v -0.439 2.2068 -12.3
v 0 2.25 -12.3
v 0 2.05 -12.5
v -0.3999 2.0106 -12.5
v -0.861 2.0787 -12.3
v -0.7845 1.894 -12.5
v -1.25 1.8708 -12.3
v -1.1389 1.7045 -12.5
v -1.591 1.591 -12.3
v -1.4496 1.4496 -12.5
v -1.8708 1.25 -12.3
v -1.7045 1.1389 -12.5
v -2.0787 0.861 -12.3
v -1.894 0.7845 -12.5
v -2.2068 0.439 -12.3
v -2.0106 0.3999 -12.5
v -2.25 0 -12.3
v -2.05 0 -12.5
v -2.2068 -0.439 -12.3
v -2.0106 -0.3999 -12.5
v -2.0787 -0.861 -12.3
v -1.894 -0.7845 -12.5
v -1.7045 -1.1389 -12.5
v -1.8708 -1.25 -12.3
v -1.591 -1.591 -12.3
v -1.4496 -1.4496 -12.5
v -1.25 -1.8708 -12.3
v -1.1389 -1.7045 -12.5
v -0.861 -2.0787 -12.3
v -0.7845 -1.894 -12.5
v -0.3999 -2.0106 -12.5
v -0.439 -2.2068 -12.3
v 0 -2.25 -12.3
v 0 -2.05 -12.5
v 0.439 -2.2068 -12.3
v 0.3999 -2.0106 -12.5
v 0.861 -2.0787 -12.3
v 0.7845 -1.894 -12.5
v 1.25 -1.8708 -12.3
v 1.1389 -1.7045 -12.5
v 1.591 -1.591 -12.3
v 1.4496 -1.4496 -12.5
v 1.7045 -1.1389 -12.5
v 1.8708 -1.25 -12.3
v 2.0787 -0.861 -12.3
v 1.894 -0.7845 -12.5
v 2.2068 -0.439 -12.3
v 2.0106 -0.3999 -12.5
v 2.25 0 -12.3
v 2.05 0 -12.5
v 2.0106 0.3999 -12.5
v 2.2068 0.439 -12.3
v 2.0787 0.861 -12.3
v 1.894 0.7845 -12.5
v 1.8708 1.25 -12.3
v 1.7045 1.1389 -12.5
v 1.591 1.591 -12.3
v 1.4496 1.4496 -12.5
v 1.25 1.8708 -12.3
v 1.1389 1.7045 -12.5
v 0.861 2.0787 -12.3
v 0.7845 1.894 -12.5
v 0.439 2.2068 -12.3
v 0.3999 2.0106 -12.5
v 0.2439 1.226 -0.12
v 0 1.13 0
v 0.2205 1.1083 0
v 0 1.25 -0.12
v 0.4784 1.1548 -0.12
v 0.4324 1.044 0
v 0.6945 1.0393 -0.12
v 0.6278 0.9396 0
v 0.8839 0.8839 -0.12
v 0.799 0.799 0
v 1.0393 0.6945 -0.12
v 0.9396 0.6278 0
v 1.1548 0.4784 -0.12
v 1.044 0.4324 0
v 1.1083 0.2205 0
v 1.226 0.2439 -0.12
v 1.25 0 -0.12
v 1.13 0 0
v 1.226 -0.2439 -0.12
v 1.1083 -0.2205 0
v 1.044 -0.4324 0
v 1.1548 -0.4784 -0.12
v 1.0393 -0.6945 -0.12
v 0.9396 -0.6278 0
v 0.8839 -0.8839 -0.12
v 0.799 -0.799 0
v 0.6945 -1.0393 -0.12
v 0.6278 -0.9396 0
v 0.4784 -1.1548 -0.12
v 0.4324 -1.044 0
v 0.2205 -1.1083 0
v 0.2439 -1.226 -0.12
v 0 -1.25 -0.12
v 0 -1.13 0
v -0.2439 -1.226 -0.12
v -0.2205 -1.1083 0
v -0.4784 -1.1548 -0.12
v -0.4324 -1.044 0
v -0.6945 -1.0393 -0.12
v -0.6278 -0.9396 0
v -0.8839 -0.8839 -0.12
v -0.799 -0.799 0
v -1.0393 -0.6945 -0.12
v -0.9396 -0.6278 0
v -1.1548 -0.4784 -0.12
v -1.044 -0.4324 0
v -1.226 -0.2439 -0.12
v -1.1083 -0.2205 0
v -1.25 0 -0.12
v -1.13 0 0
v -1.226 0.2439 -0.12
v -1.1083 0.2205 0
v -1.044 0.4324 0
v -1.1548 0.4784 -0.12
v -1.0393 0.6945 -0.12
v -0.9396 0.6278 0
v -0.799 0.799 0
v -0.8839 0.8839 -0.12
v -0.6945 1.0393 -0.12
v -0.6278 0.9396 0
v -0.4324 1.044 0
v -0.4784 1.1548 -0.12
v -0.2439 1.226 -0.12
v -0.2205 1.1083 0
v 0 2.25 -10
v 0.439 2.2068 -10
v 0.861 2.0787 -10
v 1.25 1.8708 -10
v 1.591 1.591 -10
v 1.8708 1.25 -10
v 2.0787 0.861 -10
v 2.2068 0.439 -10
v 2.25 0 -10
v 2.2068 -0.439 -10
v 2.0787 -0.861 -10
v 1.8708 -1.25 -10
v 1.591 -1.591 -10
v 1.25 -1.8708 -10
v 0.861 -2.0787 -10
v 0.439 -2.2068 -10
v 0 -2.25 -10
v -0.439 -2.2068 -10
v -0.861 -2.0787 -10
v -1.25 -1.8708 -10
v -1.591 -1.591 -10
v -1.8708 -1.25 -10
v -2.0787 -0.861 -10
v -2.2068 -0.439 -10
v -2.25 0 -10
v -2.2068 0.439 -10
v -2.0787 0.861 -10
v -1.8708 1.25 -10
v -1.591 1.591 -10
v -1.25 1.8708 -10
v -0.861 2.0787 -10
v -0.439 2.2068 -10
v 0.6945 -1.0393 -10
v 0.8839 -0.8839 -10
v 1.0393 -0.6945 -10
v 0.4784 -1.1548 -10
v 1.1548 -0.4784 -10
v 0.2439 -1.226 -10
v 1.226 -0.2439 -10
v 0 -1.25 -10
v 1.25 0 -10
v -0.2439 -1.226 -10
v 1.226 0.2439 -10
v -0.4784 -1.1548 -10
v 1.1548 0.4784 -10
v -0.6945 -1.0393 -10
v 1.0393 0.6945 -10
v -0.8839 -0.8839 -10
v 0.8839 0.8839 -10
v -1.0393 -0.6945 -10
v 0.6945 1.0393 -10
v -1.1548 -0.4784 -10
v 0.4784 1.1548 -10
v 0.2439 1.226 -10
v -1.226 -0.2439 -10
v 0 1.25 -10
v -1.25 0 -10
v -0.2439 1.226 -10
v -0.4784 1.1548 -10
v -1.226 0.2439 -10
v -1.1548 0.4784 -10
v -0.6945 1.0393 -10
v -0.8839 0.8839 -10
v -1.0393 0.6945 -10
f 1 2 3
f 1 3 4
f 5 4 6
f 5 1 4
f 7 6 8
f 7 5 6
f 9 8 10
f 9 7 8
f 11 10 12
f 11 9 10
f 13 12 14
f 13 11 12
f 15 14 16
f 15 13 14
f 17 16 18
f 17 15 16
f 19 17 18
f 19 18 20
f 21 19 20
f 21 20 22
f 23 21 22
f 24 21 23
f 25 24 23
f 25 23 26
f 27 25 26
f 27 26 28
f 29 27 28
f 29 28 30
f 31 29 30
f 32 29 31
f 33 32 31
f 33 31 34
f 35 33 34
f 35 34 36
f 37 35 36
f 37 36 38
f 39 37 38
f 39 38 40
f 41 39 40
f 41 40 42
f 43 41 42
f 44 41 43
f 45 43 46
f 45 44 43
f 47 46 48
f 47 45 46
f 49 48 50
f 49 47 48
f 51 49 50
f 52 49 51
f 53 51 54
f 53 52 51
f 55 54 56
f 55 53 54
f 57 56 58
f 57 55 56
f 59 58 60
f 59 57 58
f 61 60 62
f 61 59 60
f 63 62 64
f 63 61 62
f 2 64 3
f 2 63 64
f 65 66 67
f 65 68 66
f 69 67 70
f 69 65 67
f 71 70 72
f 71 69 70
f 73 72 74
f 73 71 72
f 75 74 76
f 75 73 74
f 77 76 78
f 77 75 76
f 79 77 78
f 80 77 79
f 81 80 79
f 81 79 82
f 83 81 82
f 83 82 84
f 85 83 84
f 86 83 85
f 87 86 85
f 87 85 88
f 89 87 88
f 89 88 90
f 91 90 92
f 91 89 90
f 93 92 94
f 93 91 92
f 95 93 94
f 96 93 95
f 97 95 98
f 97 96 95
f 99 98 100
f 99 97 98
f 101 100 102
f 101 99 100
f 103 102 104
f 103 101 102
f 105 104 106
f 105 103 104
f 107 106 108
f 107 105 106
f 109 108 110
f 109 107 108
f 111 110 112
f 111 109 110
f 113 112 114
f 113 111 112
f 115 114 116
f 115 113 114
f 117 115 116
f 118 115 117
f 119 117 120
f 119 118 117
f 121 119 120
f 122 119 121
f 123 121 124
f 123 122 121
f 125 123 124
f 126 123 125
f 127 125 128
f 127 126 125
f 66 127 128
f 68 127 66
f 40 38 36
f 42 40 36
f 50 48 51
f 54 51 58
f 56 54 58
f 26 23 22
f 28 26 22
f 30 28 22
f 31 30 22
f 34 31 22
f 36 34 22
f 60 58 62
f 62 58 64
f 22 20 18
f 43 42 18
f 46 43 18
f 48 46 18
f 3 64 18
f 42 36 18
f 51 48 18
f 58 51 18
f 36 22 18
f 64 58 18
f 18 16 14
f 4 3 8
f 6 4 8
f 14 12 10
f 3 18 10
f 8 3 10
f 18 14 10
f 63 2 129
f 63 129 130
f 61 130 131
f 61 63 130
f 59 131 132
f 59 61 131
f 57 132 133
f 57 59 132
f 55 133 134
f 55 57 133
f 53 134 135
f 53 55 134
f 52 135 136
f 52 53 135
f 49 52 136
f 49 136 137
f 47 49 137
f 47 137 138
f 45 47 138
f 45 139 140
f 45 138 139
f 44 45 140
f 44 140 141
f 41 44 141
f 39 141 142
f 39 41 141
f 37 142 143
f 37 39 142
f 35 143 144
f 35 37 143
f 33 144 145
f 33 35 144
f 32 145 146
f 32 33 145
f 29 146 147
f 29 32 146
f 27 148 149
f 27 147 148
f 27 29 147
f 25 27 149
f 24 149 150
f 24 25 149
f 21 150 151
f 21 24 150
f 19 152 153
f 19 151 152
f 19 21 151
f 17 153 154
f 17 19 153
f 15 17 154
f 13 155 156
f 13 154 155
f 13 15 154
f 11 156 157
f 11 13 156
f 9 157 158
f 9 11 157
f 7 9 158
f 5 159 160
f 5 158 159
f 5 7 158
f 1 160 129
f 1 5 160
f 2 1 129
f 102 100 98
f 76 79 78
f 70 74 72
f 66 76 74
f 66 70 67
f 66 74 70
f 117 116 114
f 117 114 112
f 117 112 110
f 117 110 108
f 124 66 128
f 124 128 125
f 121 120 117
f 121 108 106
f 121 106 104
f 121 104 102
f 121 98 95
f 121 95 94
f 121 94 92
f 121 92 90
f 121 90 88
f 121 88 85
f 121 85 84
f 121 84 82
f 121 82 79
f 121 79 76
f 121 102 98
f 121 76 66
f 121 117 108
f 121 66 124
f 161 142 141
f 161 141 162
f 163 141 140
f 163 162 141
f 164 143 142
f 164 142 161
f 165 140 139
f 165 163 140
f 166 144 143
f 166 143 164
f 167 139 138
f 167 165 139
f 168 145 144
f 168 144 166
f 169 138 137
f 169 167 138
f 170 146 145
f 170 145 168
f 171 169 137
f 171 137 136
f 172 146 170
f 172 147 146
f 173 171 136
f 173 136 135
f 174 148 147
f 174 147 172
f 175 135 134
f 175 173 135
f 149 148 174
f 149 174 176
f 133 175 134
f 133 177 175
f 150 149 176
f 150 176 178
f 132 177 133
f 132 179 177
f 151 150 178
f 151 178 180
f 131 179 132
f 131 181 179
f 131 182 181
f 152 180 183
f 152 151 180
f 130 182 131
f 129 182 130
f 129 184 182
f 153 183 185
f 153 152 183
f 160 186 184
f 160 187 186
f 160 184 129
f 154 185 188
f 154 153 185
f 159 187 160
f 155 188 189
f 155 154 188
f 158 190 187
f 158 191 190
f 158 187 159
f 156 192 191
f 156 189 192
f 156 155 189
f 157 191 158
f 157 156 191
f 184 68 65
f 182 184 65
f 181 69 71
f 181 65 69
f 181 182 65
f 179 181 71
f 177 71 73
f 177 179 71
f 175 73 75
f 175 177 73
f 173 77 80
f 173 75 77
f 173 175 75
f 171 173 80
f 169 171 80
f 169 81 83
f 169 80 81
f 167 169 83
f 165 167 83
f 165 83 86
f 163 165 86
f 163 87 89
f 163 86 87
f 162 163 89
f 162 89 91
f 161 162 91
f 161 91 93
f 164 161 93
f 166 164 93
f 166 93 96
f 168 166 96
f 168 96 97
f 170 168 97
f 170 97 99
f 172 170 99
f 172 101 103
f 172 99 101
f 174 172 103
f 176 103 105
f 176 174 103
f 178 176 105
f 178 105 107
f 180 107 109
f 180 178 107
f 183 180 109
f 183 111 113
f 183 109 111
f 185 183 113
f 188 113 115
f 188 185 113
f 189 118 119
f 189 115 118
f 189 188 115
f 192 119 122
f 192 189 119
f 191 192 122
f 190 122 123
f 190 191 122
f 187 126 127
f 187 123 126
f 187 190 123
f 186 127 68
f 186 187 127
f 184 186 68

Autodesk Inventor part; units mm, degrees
ref_plane "YZ Plane" through (0, 0, 0) normal (1, 0, 0) x (0, 1, 0)
ref_plane "XZ Plane" through (0, 0, 0) normal (0, 1, 0) x (-1, 0, 0)
ref_plane "XY Plane" through (0, 0, 0) normal (0, 0, 1) x (1, 0, 0)
sketch "スケッチ1" plane through (0, 0, 0) normal (1, 0, 0) x (0, 1, 0)
  line L0 (0, 0) -> (1.25, 0)
  line L1 (1.25, 0) -> (1.25, -10)
  line L2 (1.25, -10) -> (0, -10)
  line L3 (0, -10) -> (0, 0)
  line L4 (0, -10) -> (2.25, -10)
  line L5 (2.25, -10) -> (2.25, -12.5)
  line L6 (2.25, -12.5) -> (0, -12.5)
  line L7 (0, -12.5) -> (0, -10)
  line L8 (2.25, -12.3) -> (2.05, -12.5)
  line L9 (1.25, -0.12) -> (1.13, 0)
  point P0 (2.25, -11.25)
  point P1 (1.25, -10)
  dimension "d0" = 45
  dimension "d1" = 2.25
  dimension "d2" = 2.5
  dimension "d3" = 10
  dimension "d7" = 1.25
  dimension "d10" = 45
  dimension "d11" = 0.2
  dimension "d12" = 0.12
revolve "回転1" add sketch "スケッチ1" angle 360 about axis through (0, 0, -10) along (0, 0, 1) contours L0 L9 L1 L2 L3 | L2 L4 L5 L8 L6 L7
thread "ねじ2" size "M2.5x0.45" class "6g" standard "ANSI Metric M Profile" length 30
properties part number "CSH-316L-M2_5-10" material "ステンレス鋼"
